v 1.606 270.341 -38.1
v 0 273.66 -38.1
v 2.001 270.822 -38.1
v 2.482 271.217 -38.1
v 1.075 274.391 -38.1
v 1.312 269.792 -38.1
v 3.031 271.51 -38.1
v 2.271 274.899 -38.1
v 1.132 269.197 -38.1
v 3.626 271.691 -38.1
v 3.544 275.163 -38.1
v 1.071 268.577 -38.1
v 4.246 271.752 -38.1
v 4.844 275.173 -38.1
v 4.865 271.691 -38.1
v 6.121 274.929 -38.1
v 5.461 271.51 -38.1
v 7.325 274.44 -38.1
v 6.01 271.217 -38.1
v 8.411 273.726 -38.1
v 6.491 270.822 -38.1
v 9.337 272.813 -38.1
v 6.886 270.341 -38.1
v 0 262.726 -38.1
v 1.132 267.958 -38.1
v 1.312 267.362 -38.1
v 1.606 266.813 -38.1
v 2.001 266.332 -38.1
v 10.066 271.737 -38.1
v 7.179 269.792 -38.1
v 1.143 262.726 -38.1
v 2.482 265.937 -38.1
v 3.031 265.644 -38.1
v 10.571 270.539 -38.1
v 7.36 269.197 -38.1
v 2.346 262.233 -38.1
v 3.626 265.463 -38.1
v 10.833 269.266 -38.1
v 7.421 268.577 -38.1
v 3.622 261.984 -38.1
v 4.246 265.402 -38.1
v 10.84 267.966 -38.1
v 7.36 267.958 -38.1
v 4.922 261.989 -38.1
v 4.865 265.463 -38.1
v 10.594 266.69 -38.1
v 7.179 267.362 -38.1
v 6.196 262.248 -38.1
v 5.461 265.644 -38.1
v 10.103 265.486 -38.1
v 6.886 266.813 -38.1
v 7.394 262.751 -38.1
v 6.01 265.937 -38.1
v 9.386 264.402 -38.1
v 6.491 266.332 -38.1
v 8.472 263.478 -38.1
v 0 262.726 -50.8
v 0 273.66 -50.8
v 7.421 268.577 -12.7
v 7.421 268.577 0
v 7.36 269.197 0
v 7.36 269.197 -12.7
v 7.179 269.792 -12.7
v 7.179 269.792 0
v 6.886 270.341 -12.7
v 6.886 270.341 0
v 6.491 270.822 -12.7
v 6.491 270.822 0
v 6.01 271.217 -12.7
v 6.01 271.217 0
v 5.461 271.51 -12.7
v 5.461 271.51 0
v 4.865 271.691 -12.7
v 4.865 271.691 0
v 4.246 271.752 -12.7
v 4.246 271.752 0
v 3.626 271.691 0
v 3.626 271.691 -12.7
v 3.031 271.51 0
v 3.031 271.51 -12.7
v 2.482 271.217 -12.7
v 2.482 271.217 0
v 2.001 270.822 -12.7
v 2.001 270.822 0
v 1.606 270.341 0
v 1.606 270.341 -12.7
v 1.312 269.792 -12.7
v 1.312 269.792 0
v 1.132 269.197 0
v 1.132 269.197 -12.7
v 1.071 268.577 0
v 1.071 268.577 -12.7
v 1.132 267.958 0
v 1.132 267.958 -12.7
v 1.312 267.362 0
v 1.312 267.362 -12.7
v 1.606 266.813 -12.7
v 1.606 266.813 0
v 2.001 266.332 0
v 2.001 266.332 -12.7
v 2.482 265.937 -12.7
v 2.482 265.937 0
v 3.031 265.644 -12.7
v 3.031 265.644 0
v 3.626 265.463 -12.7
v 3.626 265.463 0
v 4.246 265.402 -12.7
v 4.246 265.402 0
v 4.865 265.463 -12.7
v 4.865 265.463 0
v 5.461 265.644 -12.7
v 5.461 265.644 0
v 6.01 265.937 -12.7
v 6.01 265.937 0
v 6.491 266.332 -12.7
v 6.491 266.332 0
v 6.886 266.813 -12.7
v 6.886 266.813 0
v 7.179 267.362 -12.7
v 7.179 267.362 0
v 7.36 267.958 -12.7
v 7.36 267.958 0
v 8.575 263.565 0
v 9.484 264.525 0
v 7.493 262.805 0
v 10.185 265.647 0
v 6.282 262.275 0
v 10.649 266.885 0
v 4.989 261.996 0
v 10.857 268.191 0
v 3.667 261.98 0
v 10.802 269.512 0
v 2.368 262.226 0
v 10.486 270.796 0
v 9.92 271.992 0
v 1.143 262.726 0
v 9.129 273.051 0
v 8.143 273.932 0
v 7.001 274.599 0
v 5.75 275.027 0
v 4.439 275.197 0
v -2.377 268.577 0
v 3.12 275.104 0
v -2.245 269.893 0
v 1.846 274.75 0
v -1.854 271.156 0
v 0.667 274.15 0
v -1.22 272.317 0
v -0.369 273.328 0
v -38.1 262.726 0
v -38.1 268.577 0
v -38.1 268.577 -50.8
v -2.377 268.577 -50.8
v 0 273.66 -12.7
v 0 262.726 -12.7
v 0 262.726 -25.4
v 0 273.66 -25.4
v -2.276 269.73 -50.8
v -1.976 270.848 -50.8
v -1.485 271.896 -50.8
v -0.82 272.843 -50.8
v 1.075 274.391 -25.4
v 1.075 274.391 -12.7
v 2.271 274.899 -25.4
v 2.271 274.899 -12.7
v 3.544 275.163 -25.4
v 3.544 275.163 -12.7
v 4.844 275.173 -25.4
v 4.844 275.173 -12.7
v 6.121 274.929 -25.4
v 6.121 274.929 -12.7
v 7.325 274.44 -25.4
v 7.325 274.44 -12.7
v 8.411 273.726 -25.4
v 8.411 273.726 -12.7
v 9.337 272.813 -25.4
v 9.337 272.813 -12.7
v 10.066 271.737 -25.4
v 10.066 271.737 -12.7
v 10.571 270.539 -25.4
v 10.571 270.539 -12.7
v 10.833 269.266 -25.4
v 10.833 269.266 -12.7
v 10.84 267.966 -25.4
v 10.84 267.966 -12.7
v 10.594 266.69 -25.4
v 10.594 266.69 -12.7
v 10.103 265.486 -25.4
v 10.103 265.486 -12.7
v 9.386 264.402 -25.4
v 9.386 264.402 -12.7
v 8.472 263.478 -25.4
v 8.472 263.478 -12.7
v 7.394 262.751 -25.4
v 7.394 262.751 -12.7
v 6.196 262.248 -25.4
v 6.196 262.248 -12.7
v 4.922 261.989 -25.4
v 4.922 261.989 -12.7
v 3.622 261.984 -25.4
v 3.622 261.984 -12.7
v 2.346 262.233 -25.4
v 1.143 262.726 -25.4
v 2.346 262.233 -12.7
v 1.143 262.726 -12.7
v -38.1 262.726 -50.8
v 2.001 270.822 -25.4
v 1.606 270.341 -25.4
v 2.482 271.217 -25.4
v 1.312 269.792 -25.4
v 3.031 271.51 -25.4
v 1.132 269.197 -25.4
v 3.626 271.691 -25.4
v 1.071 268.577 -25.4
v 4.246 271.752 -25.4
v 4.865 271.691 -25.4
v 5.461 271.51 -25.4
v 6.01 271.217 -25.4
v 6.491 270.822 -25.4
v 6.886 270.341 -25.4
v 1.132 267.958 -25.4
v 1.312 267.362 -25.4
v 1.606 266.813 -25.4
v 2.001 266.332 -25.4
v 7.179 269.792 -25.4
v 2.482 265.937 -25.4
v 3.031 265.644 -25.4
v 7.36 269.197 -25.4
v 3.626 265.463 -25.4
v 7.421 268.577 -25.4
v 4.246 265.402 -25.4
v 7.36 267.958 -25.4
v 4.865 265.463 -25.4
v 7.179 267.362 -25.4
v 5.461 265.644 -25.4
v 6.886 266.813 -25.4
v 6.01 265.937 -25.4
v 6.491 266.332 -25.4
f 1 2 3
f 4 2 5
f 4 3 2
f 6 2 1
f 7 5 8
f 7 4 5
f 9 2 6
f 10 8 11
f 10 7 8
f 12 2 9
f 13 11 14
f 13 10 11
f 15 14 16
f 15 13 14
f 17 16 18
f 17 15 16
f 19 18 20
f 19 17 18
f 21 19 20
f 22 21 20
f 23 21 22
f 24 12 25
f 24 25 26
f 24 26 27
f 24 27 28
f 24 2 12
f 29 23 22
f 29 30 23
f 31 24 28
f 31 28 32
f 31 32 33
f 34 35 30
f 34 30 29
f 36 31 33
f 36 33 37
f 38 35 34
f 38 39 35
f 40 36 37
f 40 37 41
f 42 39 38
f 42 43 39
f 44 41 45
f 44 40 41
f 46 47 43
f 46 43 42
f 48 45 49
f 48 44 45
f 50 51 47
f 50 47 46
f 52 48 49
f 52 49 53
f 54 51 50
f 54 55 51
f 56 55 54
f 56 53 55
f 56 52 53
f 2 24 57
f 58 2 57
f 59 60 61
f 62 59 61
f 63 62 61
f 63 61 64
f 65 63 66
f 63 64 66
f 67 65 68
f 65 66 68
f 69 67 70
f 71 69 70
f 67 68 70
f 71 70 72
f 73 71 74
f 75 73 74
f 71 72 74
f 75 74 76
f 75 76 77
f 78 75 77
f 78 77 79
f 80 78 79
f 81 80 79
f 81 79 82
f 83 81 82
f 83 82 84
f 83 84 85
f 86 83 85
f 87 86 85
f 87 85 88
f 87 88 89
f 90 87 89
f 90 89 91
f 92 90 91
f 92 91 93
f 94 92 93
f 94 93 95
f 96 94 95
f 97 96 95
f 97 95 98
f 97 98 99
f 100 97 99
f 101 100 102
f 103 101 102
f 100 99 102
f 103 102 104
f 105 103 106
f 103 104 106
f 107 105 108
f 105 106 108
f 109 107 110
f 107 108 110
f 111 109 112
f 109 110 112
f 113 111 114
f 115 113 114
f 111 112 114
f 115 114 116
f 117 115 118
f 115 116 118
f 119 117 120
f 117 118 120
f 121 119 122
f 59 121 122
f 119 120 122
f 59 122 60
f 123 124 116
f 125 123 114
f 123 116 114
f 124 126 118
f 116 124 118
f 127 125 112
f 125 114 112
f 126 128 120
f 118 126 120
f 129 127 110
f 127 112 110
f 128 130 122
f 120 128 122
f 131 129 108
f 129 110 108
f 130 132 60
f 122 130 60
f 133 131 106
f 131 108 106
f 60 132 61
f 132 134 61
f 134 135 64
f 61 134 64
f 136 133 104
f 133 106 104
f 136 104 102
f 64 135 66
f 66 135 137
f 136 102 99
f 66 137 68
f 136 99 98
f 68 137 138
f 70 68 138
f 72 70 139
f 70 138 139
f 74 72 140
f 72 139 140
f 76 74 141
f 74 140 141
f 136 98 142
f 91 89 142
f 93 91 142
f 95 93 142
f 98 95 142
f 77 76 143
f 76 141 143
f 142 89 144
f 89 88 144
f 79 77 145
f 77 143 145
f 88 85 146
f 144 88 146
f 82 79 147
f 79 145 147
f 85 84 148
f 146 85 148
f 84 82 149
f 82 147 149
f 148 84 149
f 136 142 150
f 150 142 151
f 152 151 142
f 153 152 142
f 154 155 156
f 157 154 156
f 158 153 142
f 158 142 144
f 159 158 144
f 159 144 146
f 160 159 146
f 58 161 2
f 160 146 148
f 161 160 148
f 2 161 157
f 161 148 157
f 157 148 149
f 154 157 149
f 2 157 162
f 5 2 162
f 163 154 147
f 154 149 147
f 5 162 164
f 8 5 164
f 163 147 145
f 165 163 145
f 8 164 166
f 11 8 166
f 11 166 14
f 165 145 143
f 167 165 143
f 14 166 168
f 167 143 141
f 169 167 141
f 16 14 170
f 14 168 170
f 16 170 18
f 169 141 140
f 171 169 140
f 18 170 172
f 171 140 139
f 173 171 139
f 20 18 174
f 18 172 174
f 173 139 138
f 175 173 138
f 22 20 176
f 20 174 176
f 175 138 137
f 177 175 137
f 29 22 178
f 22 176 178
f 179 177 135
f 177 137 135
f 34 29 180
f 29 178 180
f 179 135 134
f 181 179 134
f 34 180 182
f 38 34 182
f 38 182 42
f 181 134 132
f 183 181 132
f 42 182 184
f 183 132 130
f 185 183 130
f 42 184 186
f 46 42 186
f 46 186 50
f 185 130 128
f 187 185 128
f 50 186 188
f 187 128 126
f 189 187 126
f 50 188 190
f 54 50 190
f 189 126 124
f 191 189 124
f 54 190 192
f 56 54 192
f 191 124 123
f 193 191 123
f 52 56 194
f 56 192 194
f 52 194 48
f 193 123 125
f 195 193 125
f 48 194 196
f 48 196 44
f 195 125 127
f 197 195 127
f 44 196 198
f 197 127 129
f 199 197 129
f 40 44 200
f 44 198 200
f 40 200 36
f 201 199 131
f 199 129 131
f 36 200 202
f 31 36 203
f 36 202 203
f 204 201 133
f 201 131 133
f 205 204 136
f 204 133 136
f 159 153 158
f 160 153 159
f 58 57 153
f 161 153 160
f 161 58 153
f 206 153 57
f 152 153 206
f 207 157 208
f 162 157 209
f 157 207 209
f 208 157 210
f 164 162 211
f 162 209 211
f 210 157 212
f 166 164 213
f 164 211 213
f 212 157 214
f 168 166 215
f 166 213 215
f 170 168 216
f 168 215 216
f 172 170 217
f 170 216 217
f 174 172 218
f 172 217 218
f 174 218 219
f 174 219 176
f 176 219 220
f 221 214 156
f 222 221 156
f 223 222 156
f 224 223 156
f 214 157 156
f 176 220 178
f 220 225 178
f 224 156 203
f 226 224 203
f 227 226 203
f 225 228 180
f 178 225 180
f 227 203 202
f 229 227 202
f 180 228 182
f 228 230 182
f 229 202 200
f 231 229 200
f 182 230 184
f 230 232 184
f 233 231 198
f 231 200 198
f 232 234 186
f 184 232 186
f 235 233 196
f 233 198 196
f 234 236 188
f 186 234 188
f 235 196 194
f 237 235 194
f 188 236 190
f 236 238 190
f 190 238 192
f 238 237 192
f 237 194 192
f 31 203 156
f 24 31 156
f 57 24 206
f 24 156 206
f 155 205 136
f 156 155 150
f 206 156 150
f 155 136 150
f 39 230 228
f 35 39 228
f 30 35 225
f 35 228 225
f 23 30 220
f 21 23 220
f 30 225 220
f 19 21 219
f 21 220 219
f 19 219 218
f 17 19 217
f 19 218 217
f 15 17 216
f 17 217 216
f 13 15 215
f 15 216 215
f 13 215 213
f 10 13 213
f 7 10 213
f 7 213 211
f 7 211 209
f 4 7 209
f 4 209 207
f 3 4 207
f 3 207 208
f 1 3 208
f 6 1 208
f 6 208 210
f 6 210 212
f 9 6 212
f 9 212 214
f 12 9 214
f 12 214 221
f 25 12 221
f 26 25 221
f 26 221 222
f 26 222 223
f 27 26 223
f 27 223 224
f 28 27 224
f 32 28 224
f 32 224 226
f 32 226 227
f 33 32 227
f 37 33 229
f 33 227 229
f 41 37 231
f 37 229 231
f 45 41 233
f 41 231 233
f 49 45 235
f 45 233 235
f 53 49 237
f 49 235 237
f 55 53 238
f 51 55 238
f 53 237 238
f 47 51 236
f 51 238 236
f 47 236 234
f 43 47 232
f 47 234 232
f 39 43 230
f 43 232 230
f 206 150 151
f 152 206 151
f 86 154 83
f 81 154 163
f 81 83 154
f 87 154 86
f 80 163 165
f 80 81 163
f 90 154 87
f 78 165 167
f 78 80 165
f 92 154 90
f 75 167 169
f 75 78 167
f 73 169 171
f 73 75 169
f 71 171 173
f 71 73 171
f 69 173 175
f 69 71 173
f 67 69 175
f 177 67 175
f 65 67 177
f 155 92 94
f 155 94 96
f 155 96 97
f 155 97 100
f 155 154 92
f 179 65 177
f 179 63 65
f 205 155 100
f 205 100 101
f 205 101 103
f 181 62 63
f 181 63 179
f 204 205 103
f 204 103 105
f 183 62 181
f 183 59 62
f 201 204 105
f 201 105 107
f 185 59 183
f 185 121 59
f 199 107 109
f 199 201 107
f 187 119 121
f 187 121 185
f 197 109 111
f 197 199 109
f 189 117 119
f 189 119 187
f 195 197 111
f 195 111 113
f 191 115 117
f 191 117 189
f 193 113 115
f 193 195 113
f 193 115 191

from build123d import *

# Parameters (mm, degrees)
SKETCH1_R               = 3.175
BOSS_EXTRUDE1_DEPTH     = 50.8
CUT_EXTRUDE1_DEPTH      = 64.844432524
CUT_EXTRUDE1_DEPTH_BACK = 64.844432524
SKETCH2_W               = 10.868428171
SKETCH2_H               = 12.7
SKETCH2_H_2             = 12.700000009


with BuildPart() as part:
    # Sketch1 → Boss-Extrude1 (new body)
    with BuildSketch(Plane.XY):
        with BuildLine():
            Line((1.143472567, 262.725830005), (-38.1, 262.725830005))
            Line((-38.1, 262.725830005), (-38.1, 268.577174682))
            Line((-38.1, 268.577174682), (-2.377184588, 268.577174682))
            ThreePointArc((-2.377184588, 268.577174682), (9.92041245, 271.991602208), (1.143472567, 262.725830005))
        make_face()
        with Locations((4.245621792, 268.577174682)):
            Circle(SKETCH1_R, mode=Mode.SUBTRACT)
    extrude(amount=-BOSS_EXTRUDE1_DEPTH)

    # Sketch2 → Cut-Extrude1 (cut, two sides: drawn at the far end of the back side and taken through both)
    with BuildSketch(Plane(origin=(0, 268.577174682, 0), x_dir=(1, 0, 0), z_dir=(0, 1, 0)).offset(-CUT_EXTRUDE1_DEPTH_BACK)):
        with Locations((5.434214086, 19.05)):
            Rectangle(SKETCH2_W, SKETCH2_H)
        with Locations((5.434214086, 44.449999996)):
            Rectangle(SKETCH2_W, SKETCH2_H_2)
    extrude(amount=CUT_EXTRUDE1_DEPTH + CUT_EXTRUDE1_DEPTH_BACK, mode=Mode.SUBTRACT)


solid = part.part
